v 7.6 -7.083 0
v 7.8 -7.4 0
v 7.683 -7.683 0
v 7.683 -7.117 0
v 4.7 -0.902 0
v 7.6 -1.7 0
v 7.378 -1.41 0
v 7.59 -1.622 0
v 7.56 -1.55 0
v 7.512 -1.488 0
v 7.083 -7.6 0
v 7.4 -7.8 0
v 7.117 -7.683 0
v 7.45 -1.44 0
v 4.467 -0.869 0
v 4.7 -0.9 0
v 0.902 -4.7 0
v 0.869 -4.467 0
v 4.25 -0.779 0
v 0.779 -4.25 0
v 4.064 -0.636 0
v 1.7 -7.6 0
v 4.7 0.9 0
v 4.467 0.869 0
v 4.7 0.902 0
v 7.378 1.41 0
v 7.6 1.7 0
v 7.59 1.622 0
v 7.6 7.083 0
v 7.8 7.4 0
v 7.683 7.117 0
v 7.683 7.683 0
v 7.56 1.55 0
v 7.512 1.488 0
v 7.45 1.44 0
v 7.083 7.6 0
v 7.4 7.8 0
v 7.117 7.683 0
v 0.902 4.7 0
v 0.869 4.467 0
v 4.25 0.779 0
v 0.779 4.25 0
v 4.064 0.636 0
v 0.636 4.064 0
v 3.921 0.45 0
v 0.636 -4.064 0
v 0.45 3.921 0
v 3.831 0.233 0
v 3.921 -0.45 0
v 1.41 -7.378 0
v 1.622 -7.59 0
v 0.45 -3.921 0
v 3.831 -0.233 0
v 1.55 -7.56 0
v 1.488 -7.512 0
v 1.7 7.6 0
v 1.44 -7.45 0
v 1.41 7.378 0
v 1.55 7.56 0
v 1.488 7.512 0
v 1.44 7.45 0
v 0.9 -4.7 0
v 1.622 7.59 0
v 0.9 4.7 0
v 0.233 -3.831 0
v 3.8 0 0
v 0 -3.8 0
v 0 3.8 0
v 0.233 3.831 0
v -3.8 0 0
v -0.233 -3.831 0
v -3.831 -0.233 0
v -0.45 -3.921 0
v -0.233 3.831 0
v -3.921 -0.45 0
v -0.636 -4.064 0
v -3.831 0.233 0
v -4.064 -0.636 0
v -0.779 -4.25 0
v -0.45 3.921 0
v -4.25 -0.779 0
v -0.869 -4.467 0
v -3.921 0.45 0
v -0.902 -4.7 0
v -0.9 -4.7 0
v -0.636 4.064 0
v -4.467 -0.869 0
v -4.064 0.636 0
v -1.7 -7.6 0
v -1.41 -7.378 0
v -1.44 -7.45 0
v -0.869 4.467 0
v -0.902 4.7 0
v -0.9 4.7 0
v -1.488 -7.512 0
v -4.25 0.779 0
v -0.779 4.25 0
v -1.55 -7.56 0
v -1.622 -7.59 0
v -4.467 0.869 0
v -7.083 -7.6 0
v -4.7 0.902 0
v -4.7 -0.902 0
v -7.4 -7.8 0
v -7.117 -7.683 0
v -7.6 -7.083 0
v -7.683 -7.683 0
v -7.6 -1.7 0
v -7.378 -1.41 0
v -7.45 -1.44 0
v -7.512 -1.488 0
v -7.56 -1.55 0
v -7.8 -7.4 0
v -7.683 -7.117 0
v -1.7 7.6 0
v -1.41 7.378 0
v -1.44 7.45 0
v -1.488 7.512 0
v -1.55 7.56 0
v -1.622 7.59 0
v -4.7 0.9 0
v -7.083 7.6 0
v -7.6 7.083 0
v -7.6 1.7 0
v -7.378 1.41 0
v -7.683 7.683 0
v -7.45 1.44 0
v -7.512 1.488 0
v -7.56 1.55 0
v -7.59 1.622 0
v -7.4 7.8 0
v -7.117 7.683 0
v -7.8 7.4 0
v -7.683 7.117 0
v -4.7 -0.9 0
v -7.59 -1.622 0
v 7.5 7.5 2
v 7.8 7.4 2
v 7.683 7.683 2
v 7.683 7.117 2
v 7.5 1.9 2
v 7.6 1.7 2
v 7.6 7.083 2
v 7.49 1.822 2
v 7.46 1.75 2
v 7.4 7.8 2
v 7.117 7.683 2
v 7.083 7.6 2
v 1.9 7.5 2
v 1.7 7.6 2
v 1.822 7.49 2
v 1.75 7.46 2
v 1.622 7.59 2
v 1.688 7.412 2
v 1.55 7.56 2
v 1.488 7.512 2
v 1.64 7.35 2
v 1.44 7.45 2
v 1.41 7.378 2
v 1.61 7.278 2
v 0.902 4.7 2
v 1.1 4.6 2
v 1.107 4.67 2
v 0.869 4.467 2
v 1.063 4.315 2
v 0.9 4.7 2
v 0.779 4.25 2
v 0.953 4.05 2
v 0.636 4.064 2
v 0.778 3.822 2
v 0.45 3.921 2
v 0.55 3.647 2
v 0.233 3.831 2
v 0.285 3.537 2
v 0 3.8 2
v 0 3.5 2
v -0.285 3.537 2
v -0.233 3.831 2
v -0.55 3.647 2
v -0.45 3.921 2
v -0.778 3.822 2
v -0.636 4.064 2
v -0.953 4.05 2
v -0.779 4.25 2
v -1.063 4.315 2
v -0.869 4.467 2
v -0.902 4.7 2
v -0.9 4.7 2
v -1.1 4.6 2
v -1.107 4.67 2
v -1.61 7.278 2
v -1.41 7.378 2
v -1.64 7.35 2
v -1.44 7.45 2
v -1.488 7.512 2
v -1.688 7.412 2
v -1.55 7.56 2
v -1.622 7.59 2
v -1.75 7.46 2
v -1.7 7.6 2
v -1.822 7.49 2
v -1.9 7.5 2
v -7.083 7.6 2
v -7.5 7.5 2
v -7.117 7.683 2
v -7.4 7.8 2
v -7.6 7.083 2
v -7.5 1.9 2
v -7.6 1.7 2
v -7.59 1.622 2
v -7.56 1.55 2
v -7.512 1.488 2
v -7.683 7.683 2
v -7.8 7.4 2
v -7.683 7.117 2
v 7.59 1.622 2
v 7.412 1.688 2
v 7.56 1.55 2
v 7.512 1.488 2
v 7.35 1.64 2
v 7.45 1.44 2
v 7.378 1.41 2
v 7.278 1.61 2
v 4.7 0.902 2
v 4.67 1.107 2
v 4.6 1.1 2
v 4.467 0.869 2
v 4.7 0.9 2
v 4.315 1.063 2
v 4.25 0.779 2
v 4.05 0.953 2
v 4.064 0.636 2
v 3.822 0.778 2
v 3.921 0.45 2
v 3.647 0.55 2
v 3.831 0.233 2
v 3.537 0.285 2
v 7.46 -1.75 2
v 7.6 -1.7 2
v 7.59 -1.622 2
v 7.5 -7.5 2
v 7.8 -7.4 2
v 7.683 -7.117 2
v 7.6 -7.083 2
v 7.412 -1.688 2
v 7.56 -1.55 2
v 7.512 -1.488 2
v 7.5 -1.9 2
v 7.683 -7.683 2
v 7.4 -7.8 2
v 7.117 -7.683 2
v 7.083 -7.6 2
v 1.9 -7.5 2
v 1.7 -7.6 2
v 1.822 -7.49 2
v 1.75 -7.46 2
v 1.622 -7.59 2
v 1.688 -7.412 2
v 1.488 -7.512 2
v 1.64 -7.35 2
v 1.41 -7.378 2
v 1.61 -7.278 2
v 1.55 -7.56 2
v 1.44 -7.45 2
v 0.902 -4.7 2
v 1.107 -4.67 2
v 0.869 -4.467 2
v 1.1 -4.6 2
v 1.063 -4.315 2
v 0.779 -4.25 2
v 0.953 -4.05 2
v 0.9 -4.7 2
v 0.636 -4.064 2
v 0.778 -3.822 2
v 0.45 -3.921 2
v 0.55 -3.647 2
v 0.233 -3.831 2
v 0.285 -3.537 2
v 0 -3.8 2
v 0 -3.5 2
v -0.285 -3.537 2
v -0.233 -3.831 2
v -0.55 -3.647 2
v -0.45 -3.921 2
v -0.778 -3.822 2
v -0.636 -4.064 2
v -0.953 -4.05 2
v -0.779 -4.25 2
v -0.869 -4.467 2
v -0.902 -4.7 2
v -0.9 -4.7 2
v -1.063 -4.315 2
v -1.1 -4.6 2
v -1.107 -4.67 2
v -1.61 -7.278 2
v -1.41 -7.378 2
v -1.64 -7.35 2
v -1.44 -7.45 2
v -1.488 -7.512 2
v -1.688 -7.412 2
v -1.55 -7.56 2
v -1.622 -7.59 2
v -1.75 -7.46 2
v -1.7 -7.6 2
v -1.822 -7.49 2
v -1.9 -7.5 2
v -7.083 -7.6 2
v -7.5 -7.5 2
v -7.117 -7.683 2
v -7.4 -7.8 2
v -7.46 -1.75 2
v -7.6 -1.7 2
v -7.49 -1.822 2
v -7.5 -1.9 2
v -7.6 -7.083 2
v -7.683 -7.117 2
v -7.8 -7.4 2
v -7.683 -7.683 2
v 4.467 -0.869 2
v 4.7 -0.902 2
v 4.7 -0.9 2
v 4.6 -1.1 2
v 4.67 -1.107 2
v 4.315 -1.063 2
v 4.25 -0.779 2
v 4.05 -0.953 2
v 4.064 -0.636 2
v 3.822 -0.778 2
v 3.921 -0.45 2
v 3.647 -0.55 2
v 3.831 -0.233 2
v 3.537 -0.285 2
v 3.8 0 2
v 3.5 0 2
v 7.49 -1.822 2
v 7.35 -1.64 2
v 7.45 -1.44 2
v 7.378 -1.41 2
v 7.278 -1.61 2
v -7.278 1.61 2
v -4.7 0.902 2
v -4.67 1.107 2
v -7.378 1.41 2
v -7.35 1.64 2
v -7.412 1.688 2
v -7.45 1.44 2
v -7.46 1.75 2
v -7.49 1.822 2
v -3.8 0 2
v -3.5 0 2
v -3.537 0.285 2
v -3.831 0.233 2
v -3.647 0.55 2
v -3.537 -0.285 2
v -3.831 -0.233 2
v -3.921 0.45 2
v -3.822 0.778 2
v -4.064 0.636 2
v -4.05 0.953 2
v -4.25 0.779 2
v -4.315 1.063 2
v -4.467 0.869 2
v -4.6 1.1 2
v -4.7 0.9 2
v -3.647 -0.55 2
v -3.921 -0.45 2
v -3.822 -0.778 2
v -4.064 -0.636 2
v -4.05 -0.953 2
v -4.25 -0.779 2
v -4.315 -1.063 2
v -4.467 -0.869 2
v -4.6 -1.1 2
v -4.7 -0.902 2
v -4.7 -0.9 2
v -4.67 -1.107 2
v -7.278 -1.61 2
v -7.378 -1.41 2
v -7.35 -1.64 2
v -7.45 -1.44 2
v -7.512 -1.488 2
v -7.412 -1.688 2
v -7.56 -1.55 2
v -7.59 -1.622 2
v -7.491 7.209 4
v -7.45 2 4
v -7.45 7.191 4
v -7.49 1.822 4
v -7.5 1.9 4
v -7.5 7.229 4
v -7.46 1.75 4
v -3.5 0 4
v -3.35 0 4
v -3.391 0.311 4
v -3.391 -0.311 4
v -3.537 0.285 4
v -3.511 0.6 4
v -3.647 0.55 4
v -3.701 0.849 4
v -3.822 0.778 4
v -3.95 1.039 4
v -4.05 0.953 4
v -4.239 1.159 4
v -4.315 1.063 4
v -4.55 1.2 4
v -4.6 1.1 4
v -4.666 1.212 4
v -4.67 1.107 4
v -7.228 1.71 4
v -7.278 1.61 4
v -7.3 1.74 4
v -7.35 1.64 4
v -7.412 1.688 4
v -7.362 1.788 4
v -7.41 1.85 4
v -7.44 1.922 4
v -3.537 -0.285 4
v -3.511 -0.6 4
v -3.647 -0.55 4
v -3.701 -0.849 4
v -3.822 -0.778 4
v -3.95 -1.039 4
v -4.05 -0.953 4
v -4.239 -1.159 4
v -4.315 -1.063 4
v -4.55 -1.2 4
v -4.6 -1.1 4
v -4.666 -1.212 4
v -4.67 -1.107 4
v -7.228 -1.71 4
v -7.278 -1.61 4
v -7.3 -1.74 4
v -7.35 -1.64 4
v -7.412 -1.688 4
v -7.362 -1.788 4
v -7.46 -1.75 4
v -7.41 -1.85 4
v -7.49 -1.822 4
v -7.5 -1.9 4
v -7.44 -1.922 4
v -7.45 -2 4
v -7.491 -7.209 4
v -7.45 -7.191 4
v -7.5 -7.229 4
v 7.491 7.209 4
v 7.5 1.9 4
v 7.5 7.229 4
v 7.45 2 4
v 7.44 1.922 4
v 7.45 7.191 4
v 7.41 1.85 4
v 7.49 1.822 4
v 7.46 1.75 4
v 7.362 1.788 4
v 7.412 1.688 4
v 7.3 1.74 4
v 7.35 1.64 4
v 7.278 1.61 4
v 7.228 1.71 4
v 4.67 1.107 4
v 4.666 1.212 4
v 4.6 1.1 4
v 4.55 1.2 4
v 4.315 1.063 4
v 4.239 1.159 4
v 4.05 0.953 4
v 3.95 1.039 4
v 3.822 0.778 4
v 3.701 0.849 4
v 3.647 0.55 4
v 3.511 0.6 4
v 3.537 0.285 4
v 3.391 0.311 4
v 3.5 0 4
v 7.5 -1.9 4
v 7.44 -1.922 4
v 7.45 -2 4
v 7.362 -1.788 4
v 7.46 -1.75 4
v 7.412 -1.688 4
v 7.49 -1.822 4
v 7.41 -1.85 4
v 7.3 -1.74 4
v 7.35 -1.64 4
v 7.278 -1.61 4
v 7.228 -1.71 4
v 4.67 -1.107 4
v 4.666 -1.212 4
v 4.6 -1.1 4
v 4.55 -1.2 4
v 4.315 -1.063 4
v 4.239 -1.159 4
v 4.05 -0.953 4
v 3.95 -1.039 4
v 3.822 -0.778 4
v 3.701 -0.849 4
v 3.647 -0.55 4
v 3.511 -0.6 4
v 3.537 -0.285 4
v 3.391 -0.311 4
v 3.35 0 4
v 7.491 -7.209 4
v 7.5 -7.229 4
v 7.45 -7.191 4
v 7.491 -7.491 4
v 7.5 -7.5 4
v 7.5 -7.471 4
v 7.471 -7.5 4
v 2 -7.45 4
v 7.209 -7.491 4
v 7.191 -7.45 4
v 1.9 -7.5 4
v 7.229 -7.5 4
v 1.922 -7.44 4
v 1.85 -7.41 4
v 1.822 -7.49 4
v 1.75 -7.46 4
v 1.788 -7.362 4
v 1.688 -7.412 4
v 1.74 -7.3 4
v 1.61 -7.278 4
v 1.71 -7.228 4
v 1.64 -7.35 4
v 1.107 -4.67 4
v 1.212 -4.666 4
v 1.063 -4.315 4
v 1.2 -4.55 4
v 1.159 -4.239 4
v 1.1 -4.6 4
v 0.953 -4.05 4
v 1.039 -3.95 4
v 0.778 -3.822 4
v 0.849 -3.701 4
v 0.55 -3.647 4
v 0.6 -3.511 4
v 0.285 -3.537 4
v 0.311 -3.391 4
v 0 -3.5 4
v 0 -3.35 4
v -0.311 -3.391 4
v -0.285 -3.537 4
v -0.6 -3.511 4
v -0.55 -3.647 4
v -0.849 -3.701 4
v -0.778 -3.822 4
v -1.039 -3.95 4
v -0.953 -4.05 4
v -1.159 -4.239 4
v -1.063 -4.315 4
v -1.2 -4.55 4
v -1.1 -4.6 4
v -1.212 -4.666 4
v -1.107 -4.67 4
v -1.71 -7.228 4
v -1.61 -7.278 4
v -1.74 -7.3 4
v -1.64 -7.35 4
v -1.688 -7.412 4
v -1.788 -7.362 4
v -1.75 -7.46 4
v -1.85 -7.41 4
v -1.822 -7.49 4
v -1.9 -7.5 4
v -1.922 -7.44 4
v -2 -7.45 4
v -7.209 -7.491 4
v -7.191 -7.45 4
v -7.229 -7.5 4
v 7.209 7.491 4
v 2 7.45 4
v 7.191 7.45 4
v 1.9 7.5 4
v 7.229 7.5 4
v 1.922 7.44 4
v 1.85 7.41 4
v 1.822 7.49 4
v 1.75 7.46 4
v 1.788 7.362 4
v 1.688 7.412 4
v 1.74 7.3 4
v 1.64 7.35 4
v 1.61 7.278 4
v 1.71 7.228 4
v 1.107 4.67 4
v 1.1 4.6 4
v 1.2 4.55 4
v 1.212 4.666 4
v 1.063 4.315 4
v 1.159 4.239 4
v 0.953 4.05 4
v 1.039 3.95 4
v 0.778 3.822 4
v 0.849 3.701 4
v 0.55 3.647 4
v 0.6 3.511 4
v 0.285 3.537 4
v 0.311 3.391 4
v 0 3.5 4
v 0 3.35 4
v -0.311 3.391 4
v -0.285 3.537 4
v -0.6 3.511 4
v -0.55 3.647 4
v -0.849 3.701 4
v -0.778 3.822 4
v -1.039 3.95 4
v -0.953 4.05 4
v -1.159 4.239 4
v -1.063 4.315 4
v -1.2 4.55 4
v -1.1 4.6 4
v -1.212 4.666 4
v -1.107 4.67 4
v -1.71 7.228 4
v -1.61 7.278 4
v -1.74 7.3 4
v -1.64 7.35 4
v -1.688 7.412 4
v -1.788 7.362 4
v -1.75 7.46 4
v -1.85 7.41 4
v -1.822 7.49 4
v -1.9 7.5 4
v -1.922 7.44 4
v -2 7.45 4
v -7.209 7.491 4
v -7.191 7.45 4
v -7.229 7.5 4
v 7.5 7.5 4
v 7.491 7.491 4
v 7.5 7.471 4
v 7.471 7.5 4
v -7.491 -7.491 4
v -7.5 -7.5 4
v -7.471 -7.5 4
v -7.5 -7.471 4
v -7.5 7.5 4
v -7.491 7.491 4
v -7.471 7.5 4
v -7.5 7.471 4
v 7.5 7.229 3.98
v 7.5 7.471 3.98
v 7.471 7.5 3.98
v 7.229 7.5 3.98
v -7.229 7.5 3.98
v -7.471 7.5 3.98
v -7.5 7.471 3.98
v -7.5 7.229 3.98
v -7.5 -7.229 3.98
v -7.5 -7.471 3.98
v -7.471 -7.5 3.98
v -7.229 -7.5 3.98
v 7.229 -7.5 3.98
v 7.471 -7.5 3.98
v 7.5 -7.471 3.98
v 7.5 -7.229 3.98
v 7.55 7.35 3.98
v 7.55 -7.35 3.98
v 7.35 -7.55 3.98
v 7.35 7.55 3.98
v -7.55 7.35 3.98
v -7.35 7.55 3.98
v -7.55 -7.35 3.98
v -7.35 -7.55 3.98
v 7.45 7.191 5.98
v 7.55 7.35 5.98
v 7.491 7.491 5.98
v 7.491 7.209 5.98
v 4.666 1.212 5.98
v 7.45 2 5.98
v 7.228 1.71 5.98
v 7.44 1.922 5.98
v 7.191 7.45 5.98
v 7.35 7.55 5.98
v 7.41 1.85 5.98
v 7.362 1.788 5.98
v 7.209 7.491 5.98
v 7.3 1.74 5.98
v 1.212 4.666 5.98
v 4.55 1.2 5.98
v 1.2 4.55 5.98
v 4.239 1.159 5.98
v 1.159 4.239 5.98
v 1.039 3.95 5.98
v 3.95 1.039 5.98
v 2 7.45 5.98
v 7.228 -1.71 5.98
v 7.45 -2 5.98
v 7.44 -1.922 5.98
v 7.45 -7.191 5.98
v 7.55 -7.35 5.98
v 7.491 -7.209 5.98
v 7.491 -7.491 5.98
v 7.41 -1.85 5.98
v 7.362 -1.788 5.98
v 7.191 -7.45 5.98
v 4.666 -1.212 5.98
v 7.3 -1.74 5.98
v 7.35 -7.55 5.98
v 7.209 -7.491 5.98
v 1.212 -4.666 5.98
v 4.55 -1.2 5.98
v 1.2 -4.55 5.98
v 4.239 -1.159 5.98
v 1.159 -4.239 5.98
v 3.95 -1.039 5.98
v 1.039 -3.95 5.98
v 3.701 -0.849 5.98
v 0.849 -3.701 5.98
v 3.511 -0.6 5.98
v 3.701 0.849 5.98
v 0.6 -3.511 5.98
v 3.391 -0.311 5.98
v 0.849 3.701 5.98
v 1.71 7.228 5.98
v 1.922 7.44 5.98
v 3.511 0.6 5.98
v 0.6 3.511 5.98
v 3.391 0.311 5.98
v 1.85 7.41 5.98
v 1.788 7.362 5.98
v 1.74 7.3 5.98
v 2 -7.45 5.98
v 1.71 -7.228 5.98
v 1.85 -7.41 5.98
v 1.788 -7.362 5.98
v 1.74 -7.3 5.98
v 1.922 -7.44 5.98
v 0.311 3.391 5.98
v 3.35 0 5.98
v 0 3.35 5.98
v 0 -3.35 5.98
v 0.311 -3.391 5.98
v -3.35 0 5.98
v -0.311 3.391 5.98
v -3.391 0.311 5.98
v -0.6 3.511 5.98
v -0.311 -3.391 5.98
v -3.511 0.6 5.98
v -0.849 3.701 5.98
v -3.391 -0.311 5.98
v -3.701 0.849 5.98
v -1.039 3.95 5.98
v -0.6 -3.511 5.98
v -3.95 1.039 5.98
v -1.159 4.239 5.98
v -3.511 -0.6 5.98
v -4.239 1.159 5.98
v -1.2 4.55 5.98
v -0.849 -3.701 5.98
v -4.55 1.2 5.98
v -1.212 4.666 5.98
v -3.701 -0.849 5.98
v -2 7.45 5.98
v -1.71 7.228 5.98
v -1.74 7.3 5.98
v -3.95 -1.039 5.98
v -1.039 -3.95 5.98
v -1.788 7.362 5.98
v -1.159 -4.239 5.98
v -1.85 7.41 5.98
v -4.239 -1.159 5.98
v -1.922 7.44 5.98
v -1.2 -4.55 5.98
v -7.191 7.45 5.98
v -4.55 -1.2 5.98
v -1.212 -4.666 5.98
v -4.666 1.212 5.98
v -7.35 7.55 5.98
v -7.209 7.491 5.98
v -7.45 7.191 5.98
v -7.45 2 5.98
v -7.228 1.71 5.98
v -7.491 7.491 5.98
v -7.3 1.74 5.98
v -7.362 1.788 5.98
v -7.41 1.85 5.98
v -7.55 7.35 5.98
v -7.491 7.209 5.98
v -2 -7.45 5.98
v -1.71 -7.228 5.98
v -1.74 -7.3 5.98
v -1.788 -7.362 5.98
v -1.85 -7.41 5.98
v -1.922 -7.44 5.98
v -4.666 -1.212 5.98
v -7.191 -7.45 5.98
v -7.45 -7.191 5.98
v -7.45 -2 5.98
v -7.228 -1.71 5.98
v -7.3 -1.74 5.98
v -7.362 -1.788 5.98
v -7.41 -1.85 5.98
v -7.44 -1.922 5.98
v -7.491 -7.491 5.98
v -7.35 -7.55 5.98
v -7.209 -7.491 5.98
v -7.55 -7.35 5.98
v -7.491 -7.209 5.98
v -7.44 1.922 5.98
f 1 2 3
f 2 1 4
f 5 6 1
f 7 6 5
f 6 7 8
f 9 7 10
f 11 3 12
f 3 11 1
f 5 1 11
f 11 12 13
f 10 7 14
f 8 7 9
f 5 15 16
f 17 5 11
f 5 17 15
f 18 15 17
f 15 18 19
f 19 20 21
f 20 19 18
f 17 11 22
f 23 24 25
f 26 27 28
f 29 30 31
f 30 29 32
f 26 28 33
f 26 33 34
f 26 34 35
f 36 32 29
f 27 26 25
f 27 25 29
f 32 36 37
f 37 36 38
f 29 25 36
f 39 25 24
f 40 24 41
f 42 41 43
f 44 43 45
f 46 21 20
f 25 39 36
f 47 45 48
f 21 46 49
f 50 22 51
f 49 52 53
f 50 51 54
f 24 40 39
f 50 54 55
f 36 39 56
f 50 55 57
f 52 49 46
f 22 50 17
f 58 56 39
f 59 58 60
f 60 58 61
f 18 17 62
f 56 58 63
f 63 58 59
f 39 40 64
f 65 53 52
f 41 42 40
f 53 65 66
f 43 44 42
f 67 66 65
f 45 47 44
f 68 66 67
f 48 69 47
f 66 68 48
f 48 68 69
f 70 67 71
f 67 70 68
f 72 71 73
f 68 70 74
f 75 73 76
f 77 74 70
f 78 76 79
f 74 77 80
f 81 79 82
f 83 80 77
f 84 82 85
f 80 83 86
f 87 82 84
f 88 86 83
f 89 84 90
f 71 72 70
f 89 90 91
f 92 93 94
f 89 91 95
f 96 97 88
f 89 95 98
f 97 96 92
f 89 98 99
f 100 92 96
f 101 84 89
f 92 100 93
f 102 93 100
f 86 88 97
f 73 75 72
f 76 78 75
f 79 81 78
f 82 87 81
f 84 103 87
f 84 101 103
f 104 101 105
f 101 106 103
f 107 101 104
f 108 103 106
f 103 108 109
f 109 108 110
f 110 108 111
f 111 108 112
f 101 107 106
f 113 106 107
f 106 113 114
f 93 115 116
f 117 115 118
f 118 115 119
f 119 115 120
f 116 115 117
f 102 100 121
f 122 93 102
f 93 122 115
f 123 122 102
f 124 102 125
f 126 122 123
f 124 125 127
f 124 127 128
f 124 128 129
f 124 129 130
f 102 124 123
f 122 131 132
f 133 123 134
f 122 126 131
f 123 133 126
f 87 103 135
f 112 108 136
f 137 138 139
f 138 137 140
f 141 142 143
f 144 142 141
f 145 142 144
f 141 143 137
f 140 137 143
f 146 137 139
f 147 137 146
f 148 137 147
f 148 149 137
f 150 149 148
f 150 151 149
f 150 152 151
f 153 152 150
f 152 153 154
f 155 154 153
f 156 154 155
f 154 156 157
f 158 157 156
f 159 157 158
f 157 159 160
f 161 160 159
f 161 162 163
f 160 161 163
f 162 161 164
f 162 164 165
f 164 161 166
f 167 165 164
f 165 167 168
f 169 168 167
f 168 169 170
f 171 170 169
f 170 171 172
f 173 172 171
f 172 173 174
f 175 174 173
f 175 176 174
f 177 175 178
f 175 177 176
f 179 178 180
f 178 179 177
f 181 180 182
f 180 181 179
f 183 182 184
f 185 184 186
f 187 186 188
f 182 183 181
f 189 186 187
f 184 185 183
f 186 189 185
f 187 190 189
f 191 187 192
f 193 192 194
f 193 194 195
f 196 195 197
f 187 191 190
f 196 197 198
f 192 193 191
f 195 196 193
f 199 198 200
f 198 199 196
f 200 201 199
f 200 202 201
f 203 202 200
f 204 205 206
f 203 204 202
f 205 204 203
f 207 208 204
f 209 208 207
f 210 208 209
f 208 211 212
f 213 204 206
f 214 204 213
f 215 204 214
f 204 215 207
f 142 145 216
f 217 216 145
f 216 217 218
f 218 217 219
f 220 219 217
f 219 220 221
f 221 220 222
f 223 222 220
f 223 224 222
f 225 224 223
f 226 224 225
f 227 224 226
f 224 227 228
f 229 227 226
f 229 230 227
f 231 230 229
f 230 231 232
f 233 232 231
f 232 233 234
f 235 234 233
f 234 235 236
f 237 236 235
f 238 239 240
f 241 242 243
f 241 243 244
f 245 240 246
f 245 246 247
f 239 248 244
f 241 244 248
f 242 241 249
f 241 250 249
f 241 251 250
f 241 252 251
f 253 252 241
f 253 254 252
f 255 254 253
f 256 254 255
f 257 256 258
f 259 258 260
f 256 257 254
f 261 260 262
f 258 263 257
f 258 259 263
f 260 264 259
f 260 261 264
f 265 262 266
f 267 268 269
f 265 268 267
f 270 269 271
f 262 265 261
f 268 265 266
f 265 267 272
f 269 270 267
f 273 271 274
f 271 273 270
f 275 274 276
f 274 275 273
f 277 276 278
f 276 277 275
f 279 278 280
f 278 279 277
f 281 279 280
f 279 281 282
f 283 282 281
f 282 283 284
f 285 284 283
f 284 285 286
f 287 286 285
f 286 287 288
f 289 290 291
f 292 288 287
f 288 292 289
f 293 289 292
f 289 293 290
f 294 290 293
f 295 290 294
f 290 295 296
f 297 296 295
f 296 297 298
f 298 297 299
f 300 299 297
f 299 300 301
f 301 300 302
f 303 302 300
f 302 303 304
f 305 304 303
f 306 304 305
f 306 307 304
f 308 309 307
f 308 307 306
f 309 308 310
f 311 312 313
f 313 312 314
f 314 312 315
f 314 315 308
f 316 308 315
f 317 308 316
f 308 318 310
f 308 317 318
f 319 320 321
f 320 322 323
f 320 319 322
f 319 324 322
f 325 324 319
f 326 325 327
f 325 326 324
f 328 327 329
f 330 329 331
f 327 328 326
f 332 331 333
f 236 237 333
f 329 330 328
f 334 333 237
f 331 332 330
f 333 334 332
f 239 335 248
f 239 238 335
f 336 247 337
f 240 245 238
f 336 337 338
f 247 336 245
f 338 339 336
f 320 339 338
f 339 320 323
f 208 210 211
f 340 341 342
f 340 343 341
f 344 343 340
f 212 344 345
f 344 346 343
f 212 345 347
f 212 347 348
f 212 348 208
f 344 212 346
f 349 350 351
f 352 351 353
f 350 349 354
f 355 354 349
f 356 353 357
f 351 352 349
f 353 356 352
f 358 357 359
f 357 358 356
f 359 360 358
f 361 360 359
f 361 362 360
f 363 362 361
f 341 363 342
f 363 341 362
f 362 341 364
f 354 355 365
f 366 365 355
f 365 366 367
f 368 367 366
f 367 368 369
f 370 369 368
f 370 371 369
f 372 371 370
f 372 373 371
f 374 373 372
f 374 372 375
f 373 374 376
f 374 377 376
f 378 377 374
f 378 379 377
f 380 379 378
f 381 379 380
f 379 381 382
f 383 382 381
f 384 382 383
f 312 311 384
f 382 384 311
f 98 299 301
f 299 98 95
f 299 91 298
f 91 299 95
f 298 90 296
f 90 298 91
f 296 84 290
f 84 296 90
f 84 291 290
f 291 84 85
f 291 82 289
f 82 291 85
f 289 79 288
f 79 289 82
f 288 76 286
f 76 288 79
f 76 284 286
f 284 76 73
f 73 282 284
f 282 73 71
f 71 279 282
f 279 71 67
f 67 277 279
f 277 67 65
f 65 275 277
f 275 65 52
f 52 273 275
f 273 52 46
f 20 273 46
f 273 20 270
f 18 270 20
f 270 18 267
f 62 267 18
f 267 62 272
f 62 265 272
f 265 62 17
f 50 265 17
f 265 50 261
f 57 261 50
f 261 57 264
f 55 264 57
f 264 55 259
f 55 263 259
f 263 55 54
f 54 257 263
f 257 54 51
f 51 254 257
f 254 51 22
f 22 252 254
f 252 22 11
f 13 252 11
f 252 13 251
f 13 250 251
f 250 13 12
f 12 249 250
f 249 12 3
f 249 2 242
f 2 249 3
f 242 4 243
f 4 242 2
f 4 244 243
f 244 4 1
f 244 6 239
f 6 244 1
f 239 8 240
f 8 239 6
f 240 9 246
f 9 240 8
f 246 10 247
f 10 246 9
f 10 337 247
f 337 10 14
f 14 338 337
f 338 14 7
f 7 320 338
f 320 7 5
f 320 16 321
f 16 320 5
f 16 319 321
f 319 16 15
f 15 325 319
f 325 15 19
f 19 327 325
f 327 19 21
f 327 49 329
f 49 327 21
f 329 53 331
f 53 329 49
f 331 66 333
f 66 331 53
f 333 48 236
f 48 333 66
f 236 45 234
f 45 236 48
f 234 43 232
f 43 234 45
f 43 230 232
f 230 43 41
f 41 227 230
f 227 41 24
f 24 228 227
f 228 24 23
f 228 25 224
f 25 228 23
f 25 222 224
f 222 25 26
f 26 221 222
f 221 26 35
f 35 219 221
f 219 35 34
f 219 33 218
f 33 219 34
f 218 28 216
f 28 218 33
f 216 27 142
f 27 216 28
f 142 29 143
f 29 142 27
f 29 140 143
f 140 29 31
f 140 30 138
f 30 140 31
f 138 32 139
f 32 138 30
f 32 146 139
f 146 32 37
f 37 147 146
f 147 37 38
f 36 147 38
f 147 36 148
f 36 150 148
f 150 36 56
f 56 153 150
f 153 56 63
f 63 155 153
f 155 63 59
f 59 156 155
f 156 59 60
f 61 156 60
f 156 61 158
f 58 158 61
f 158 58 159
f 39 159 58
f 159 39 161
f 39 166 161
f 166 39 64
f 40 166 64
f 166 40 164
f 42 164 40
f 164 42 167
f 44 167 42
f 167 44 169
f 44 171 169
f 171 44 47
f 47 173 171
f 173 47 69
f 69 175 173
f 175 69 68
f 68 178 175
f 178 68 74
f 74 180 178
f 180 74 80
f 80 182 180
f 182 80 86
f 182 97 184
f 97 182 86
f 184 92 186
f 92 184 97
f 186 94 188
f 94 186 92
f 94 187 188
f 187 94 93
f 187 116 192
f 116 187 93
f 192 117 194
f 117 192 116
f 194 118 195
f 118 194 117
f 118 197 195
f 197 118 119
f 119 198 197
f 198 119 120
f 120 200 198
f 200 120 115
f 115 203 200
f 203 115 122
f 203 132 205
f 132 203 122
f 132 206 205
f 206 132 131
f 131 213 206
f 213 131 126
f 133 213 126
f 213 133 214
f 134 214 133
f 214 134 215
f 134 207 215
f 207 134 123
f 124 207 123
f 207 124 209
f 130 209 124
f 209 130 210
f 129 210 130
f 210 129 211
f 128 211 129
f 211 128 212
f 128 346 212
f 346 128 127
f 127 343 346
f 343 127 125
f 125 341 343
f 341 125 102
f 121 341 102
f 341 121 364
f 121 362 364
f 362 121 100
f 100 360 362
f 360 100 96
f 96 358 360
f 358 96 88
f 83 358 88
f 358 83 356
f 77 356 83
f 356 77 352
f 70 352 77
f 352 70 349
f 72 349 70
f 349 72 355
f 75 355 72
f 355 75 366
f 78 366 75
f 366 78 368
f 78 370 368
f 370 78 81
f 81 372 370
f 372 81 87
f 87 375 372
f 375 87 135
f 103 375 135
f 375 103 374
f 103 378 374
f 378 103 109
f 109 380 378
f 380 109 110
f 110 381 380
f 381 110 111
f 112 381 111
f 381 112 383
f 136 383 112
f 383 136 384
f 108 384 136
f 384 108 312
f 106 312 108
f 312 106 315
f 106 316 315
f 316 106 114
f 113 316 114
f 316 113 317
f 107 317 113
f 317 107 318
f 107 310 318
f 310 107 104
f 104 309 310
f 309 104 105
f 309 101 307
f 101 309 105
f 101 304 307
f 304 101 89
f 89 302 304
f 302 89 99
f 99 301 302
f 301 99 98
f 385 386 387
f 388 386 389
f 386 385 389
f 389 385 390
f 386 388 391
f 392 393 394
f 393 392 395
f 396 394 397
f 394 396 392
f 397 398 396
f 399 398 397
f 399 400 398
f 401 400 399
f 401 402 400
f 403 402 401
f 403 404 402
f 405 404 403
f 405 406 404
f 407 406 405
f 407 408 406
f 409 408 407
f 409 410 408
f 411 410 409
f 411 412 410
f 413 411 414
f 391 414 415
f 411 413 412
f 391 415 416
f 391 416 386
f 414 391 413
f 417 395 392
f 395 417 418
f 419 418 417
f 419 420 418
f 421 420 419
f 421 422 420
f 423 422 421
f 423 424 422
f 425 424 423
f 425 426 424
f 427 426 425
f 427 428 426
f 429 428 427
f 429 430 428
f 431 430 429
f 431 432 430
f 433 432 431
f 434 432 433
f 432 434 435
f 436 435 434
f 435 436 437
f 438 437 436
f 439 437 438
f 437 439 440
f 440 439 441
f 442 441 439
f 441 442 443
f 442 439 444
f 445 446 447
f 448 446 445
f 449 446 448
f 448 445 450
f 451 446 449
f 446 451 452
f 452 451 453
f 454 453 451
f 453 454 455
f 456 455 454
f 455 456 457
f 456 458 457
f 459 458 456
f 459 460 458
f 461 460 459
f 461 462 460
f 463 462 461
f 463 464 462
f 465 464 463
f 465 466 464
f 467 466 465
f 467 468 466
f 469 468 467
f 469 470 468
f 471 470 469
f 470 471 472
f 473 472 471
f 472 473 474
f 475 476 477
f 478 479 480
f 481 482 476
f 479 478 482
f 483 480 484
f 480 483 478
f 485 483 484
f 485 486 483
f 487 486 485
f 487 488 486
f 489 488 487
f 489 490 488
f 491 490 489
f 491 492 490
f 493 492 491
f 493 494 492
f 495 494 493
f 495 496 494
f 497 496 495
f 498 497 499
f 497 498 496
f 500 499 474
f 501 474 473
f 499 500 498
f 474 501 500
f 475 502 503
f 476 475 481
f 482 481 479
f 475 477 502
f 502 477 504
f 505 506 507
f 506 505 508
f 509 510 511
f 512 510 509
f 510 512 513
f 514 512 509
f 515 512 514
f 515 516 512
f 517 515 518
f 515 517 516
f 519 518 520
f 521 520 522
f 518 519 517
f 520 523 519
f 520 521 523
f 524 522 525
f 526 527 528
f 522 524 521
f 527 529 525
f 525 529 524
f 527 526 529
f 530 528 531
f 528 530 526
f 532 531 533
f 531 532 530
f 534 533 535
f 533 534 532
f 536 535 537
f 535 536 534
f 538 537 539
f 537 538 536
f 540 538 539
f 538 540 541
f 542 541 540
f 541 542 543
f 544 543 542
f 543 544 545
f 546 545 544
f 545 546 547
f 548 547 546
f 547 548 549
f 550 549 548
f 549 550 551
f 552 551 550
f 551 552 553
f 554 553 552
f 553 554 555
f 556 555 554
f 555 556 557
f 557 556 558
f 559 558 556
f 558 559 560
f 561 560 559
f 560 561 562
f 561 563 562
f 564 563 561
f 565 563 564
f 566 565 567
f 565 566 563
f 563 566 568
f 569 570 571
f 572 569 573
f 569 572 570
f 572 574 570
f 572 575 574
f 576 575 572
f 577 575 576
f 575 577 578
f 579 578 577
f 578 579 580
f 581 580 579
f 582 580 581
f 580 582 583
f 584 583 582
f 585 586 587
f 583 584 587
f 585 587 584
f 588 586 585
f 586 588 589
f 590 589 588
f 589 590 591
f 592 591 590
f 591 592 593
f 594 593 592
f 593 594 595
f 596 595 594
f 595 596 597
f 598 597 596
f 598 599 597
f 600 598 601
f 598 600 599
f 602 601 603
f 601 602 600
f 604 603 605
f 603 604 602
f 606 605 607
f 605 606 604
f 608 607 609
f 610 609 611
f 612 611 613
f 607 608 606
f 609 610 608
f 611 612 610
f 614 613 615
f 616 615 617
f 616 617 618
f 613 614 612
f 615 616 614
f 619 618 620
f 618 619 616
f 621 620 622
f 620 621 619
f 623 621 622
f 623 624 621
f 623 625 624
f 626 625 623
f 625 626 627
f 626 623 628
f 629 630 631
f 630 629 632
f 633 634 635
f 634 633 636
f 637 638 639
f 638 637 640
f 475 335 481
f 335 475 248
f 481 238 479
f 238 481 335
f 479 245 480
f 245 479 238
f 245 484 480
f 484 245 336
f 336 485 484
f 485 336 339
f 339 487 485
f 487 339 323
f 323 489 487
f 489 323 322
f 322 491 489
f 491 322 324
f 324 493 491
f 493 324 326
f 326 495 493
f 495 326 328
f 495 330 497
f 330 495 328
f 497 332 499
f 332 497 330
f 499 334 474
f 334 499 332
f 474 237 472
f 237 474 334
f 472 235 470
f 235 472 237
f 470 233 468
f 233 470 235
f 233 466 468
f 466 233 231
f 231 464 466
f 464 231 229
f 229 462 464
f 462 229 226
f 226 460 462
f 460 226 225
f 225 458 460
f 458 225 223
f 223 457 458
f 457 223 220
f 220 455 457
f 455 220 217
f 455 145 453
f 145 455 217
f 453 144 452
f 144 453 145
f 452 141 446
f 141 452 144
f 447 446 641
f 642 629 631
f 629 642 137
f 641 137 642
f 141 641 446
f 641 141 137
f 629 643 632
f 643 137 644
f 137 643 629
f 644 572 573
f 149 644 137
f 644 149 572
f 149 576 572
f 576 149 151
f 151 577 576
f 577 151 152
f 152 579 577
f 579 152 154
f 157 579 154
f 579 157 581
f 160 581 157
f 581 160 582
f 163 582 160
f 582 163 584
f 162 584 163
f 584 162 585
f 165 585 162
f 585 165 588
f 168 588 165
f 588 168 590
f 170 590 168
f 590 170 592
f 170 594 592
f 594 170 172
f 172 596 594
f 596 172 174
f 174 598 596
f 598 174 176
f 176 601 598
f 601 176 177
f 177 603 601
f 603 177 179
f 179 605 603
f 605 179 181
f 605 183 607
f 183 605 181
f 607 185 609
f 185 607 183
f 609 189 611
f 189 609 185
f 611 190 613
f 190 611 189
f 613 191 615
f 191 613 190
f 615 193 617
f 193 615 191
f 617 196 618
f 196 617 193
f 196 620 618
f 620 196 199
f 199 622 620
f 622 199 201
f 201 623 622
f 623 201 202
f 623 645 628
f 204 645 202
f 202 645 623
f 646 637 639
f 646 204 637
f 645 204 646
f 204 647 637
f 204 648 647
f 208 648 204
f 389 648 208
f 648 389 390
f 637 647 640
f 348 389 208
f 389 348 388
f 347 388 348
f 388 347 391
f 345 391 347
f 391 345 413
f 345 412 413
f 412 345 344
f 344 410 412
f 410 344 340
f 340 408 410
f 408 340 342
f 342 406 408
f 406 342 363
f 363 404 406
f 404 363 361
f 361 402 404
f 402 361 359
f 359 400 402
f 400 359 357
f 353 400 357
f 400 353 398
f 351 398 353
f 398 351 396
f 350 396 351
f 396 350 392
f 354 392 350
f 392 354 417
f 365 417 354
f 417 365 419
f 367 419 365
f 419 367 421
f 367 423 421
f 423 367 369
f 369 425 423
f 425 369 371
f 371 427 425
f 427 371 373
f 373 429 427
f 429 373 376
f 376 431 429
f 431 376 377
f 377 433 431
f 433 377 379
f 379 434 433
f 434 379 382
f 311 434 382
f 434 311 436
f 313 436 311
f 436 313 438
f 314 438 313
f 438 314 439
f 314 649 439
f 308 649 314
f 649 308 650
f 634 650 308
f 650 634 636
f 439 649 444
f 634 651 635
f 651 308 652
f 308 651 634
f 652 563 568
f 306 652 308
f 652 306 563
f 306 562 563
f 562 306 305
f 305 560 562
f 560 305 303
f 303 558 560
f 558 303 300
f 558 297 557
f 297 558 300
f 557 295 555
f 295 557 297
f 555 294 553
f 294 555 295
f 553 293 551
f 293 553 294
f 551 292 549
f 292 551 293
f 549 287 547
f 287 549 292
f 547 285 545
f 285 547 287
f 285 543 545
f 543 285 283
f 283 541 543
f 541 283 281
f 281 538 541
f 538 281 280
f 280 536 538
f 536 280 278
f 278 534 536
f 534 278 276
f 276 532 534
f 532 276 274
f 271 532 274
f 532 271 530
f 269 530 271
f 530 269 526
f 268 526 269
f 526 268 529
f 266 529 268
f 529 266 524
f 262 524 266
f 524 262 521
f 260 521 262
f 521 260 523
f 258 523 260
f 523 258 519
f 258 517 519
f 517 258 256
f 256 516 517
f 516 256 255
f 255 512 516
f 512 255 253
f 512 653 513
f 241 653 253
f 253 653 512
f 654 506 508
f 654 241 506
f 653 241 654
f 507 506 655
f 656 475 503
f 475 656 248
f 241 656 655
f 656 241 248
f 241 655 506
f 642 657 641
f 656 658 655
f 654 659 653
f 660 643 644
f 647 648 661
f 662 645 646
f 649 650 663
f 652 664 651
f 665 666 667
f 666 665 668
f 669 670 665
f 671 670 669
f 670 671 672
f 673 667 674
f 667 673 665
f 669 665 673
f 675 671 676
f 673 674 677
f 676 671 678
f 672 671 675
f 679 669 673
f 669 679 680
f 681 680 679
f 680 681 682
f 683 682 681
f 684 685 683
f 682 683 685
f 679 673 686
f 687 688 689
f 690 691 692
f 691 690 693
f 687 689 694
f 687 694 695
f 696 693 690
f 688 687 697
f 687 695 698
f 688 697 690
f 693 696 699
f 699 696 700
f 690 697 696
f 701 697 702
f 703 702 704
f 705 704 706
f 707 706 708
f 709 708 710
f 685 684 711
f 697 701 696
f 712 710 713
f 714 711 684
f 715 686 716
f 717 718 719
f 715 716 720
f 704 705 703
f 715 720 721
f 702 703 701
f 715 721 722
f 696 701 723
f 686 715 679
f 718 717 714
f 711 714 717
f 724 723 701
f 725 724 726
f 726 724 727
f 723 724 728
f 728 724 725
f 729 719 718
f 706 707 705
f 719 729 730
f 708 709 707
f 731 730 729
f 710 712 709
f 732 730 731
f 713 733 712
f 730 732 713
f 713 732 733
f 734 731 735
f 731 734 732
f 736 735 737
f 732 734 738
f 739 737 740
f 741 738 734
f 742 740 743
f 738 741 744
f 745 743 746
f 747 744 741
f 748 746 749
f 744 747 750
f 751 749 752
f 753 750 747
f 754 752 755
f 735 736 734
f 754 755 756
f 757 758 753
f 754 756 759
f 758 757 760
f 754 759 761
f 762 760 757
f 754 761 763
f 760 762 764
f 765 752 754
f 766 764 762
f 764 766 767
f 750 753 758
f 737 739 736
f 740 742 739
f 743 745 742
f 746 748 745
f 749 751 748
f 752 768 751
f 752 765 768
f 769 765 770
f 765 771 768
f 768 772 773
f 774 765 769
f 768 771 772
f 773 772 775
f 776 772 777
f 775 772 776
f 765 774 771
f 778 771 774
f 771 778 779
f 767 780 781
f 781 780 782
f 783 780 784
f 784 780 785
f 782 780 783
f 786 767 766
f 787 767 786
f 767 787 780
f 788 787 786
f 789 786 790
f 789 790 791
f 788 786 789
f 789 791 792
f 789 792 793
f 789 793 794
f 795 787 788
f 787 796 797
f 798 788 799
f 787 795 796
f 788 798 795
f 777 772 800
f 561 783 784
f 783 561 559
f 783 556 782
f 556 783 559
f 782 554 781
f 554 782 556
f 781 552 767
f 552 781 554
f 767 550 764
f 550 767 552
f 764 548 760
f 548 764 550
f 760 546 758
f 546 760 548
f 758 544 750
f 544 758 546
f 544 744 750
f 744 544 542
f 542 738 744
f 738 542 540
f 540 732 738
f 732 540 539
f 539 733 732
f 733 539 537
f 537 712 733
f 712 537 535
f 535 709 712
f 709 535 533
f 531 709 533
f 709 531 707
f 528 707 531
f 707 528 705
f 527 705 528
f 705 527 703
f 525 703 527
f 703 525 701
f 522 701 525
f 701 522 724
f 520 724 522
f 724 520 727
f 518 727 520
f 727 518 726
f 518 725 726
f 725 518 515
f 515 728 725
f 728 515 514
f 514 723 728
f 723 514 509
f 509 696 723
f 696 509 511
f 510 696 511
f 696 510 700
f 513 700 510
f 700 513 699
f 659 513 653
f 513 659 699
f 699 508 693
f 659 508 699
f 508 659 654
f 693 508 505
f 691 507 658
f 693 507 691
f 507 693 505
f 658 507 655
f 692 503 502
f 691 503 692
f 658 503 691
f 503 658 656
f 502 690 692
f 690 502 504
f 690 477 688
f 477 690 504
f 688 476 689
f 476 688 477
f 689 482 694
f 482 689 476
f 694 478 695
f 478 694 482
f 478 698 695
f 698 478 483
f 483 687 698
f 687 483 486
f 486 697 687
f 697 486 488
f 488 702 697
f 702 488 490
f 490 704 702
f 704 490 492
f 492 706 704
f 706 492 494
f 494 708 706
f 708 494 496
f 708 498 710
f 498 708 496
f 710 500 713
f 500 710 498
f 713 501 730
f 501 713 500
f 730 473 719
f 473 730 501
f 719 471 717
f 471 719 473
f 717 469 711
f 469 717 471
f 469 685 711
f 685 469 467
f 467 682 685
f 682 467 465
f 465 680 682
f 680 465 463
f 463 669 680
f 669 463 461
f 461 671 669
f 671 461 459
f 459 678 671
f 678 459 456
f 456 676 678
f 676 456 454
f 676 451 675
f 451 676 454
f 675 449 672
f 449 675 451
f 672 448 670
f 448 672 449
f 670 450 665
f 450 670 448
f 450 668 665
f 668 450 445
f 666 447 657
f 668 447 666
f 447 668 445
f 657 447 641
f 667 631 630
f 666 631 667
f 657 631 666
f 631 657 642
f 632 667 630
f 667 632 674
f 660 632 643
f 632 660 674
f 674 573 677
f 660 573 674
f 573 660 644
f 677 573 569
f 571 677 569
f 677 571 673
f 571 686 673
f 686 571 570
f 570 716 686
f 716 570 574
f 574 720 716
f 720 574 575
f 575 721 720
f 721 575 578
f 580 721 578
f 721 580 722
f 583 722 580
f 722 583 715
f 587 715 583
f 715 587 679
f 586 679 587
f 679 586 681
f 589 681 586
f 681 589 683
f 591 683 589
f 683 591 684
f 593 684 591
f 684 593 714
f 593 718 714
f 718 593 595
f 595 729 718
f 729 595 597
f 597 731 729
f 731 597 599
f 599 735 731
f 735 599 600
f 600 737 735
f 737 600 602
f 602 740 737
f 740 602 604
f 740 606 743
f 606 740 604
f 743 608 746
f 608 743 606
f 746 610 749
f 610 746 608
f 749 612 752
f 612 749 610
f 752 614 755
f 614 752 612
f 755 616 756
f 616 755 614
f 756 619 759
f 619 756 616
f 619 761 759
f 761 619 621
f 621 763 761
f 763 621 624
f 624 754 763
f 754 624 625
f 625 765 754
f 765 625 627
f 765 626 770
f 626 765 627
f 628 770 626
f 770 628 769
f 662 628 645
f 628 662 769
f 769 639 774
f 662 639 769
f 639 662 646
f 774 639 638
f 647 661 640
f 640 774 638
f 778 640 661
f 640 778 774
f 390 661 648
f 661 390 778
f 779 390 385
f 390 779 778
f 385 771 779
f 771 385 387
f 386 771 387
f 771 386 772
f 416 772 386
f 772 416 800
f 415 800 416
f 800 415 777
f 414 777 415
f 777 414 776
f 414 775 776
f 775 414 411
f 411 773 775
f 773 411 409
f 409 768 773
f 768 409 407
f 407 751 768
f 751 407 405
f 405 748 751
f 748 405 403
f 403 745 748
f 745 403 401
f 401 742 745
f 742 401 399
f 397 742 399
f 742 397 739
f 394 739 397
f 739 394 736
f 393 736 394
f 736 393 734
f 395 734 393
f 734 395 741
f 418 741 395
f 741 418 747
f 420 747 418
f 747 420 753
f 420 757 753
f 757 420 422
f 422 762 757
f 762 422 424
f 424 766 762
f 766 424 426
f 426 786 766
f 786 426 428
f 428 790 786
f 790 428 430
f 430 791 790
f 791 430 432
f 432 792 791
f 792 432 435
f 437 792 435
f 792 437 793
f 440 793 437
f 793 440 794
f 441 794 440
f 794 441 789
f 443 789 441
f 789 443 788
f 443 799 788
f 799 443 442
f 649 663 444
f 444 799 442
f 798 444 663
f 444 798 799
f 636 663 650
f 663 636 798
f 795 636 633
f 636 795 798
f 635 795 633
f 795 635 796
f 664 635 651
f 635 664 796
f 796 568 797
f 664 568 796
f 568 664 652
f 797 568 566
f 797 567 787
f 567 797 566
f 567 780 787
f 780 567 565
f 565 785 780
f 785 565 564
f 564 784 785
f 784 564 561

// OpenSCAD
ext15(2,0.2);
ext15(4);
translate([0,0,3.98]) ext15(2,-0.1);

module ext15(len,fuzz=0) {
  linear_extrude(len) ext15profile(fuzz);
}

module slotT1profile(w,rs,re) {
$fn=24;
  hull() {
    translate([-w/2+re,-rs-re]) circle(r=re);
    translate([   -1   , -8  ]) square([1,8-rs+1.2]);
    translate([-w/2-0.5,-10  ]) square([w/2,1]);
  }
}


// rs -- radius of slot (slot width/2)
// d  -- depth  of slot
module slotTprofile(w,rs,d) {
re=0.3;
$fn=24;
  difference() {
    translate([-w/2-2,-9]) square([w/2+2,18]);

    difference() {
      union() {
        translate([-w/2+d-rs,-10]) square([6,20]);
        mirror([0,1]) slotT1profile(w,rs,re);
                      slotT1profile(w,rs,re);
      }

      translate([-w/2, 0 ,-1]) hull() {
        translate([d-rs,0]) circle(r=rs-0.5);
        translate([0,-rs+.2]) square([0.1,2*rs-.4]);
      }
    }
  }
}

module ext15profile(fuzz=0) {
w=15;

wz = w + fuzz;
w1 = wz-abs(fuzz)*2;
  difference() {
    union() {
      square([wz,wz],center=true);

      // extra room on corners, where slop can be a problem 
      if (abs(fuzz) > 0) {
      //if (fuzz > 0) { 
        for(i=[-1,1]) for(j=[-1,1])
          translate([i*w1/2,j*w1/2,0])
           circle(r=abs(fuzz)*2,$fn=8);
      }
    }

    for (a=[0:90:355]) rotate([0,0,a])
       slotTprofile(wz,3.2/2-fuzz,4.5-fuzz);
  }
}
